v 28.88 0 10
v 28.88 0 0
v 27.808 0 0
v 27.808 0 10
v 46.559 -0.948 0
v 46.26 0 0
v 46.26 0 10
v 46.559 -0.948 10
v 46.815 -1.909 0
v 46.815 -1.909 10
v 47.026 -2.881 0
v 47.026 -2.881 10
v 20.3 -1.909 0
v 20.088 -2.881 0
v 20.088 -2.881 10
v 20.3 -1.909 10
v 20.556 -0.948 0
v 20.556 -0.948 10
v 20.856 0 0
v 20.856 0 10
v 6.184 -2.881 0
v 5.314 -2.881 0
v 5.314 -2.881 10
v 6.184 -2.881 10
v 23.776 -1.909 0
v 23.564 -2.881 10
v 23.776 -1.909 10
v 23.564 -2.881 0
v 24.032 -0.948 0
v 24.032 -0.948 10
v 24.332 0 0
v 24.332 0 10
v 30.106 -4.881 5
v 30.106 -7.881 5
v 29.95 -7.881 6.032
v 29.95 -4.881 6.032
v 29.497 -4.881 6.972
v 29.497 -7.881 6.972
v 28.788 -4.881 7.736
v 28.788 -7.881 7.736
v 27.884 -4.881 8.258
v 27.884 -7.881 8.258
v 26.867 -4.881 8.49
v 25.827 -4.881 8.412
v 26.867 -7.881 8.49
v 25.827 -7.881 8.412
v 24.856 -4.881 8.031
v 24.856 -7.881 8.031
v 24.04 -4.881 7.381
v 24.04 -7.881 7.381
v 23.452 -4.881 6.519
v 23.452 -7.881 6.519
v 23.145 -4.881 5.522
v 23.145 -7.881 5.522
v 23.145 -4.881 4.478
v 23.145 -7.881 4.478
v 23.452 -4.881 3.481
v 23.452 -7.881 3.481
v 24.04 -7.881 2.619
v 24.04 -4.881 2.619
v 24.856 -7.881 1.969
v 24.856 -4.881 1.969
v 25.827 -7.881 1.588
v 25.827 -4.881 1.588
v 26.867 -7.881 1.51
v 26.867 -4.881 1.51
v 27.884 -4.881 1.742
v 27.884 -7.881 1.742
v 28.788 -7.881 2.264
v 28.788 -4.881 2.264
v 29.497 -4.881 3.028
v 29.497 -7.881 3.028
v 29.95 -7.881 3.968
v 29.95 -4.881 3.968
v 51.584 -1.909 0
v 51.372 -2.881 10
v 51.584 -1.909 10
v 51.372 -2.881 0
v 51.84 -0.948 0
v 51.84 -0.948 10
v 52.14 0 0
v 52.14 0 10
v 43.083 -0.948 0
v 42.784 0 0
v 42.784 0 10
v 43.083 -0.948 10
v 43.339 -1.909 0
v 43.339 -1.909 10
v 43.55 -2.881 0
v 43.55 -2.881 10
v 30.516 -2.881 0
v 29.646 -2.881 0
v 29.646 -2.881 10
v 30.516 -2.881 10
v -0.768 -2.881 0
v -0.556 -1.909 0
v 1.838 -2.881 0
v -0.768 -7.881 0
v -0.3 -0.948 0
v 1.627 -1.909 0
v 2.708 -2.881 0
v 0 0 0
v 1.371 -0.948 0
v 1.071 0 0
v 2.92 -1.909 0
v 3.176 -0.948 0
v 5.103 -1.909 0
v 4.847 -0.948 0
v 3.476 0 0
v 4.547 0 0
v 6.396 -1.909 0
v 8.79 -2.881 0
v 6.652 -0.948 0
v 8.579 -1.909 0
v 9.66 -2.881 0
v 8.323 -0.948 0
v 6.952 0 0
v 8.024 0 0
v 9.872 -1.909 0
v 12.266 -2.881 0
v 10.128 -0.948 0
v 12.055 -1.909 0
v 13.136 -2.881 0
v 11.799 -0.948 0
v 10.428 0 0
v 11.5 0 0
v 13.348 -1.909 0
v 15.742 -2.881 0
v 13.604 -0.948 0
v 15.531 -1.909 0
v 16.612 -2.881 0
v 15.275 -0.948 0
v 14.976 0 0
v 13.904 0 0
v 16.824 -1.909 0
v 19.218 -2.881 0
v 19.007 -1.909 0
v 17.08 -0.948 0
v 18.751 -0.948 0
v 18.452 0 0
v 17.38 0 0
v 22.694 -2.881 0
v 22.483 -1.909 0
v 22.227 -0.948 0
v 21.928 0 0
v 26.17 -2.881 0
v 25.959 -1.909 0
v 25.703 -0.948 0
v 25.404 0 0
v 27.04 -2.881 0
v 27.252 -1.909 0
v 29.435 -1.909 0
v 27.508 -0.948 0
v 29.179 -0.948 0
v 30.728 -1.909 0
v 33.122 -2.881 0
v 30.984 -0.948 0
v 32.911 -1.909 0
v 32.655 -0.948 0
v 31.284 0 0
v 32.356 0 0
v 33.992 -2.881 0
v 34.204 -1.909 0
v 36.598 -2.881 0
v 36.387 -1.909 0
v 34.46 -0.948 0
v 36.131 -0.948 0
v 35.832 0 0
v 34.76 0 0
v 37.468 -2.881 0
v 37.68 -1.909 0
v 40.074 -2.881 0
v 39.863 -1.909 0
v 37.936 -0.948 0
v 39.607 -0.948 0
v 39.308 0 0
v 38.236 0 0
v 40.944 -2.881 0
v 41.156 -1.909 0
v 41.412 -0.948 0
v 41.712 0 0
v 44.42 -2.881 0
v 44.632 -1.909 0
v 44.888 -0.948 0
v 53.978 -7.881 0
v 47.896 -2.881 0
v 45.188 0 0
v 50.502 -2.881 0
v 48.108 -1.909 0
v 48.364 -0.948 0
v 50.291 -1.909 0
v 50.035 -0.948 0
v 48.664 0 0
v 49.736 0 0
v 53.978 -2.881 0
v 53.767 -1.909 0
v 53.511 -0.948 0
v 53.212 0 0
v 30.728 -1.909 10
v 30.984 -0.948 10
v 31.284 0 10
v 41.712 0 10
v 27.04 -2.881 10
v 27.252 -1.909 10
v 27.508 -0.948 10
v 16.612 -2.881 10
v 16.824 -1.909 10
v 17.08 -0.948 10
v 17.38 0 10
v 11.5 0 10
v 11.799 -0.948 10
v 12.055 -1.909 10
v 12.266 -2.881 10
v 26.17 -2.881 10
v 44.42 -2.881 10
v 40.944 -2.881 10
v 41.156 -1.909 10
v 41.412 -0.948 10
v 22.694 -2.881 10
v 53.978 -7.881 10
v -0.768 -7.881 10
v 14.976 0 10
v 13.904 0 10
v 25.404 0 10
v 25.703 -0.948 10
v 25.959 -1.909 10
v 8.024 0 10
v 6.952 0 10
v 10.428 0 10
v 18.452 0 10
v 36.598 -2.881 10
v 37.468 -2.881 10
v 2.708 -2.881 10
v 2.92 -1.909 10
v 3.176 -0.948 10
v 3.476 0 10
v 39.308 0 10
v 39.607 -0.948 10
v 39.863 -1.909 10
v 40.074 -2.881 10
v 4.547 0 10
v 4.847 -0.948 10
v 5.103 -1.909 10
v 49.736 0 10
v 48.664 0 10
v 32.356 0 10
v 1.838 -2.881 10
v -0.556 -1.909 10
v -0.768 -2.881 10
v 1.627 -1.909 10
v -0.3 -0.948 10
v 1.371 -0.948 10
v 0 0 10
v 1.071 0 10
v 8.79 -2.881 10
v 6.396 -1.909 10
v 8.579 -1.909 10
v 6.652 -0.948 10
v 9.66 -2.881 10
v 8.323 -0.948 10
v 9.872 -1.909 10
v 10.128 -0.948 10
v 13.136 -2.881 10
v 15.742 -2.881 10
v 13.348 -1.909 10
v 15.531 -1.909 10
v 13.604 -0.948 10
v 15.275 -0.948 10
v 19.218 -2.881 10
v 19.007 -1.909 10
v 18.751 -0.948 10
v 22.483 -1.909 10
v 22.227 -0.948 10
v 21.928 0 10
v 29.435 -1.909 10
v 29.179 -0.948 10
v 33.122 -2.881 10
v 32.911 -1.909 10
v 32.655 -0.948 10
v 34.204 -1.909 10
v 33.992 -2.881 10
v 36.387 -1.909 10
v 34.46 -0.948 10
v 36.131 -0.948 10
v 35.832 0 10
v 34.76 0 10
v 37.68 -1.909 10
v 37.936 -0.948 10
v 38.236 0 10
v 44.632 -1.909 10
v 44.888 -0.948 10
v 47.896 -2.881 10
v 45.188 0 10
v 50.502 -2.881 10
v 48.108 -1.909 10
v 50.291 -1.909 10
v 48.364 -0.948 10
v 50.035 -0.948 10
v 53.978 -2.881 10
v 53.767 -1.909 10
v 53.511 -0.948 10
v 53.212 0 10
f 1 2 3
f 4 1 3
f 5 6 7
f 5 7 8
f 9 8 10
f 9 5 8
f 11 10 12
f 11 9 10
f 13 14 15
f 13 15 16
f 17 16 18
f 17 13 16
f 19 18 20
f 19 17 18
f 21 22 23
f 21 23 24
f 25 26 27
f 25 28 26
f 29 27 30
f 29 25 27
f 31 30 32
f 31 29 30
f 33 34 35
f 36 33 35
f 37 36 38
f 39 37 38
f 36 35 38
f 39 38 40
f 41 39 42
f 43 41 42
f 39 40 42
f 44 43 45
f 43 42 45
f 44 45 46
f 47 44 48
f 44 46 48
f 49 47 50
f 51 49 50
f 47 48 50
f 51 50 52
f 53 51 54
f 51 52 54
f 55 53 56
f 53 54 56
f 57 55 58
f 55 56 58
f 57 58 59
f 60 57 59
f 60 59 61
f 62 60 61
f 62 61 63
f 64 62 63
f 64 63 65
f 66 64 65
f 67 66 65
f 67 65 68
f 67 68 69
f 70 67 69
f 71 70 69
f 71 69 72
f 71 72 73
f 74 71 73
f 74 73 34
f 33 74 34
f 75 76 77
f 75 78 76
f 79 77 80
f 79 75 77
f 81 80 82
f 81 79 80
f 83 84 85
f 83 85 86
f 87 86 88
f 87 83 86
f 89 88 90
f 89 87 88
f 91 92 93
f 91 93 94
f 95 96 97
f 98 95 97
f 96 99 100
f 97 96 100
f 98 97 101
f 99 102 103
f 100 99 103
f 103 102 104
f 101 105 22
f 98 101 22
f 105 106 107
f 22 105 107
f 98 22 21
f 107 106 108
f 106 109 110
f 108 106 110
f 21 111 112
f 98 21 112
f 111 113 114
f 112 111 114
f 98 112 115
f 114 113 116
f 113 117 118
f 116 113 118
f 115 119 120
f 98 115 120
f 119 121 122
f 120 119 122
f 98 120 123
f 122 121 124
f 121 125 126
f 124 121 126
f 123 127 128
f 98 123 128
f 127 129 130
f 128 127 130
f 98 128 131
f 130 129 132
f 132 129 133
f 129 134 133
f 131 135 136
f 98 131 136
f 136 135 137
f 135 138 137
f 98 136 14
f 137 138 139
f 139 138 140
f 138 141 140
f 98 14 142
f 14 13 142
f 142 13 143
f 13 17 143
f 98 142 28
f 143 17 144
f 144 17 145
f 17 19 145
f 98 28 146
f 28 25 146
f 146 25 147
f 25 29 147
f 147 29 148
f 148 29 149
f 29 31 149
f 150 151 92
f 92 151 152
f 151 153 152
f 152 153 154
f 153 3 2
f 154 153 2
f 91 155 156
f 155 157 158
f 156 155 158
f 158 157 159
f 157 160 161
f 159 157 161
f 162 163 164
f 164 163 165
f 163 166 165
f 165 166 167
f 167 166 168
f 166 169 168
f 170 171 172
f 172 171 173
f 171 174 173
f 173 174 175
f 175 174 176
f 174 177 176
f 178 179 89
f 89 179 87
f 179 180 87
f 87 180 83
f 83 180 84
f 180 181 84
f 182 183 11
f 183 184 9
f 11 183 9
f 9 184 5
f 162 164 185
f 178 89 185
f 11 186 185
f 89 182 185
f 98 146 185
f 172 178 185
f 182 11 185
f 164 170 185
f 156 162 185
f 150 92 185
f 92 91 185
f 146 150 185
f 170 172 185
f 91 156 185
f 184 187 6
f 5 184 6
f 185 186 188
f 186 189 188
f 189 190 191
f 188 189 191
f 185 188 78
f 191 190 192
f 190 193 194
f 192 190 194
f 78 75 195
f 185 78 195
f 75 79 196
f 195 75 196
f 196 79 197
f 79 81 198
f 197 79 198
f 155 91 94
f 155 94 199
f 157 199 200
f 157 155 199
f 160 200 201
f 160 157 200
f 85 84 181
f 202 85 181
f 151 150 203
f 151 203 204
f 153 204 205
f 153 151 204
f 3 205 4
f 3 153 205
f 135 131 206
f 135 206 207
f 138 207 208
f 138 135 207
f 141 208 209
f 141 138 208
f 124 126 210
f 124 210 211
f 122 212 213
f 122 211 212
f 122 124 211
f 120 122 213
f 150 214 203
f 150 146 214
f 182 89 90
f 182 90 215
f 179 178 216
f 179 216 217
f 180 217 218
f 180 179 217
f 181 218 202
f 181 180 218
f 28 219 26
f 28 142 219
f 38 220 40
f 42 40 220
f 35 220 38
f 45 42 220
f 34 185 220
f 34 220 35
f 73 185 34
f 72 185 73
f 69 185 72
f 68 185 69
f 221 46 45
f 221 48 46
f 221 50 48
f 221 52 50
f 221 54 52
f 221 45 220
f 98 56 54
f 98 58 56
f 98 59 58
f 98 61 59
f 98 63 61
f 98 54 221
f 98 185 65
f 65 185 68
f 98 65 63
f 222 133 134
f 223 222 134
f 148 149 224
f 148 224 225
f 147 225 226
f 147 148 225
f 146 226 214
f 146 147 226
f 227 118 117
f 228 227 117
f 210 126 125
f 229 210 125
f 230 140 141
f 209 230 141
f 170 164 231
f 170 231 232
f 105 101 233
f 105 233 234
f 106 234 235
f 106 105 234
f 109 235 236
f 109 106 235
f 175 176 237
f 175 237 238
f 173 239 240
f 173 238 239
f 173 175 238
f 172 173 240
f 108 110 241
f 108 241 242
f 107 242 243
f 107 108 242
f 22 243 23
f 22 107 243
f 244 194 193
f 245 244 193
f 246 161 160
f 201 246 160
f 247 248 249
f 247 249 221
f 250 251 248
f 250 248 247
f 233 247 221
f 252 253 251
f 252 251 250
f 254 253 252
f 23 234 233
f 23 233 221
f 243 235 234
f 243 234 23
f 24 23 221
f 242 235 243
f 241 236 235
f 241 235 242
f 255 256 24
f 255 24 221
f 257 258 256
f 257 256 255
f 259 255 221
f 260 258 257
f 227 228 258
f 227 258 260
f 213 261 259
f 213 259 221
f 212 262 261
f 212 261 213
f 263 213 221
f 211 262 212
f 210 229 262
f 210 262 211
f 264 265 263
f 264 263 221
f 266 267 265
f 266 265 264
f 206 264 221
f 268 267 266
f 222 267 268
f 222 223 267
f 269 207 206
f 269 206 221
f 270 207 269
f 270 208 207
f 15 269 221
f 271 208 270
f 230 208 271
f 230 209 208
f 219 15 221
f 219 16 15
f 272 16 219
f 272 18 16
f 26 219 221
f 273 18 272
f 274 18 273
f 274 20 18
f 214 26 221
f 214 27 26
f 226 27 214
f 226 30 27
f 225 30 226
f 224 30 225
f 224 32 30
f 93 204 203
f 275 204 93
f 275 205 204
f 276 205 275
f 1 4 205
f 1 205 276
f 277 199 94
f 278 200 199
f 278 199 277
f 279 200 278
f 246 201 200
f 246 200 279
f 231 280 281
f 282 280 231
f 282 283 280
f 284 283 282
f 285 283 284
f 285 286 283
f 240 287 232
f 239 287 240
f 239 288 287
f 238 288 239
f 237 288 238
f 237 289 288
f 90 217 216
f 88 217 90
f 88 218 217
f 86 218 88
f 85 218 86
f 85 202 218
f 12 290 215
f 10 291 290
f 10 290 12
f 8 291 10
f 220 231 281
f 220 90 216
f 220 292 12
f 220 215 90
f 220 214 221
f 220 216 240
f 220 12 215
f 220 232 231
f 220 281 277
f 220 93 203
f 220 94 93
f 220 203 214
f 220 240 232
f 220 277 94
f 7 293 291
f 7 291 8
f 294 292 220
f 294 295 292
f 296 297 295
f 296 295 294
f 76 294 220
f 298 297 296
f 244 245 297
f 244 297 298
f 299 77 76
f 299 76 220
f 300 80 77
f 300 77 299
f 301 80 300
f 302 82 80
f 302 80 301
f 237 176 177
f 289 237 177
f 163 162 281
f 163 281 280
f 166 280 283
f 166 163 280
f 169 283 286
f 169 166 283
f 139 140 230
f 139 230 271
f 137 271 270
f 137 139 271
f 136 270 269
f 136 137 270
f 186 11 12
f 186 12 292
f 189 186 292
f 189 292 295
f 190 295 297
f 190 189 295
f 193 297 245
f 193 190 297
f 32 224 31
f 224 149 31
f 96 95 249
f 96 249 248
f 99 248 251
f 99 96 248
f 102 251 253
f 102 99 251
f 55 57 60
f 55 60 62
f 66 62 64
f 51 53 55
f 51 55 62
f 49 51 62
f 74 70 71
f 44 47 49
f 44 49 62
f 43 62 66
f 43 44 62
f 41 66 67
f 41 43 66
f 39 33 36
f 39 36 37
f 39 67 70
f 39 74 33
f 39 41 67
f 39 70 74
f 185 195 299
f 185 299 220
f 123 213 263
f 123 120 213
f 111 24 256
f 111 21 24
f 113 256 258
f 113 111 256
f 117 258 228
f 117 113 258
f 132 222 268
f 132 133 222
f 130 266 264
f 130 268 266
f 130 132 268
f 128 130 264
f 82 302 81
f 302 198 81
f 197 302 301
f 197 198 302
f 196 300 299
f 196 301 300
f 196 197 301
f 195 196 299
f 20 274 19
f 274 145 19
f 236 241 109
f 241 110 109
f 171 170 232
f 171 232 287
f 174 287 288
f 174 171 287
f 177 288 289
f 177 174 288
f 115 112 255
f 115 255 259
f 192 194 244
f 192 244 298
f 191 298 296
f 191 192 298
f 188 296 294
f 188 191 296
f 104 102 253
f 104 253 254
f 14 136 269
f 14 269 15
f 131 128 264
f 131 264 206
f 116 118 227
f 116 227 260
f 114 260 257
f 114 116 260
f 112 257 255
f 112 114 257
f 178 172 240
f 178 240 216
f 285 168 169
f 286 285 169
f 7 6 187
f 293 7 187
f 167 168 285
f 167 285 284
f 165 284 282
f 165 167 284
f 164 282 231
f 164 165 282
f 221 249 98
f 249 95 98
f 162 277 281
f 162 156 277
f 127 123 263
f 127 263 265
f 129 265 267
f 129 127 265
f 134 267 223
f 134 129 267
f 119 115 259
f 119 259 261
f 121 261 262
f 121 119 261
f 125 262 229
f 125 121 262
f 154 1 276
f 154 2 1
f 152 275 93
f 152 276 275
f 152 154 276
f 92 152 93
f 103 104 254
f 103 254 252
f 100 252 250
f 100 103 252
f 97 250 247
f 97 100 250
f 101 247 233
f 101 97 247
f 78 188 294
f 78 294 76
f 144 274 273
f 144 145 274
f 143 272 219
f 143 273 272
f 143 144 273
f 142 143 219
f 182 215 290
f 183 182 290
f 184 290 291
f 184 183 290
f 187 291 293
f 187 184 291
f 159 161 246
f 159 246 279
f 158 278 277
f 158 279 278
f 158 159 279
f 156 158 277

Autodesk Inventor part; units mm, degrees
ref_plane "YZ Plane" through (0, 0, 0) normal (1, 0, 0) x (0, 1, 0)
ref_plane "XZ Plane" through (0, 0, 0) normal (0, 1, 0) x (-1, 0, 0)
ref_plane "XY Plane" through (0, 0, 0) normal (0, 0, 1) x (1, 0, 0)
sketch "Sketch1" plane through (0, 0, 0) normal (0, 0, 1) x (1, 0, 0)
  line L0 (0, 0) -> (1.071, 0)
  line L1 (0.5355, 0) -> (0.5355, -2.881)
  line L2 (0.5355, -2.881) -> (1.8385, -2.881)
  line L3 (1.8385, -2.881) -> (0.5355, -2.881)
  line L4 (0.5355, -2.881) -> (-0.7675, -2.881)
  arc A0 (0, 0) -> (-0.7675, -2.881) centre (20.5625, -7.0206) ccw
  arc A1 (1.8385, -2.881) -> (1.071, 0) centre (-19.4915, -7.0206) ccw
  line L5 (1.8385, -2.881) -> (2.7085, -2.881)
  line L6 (2.7085, -2.881) -> (5.3145, -2.881)
  line L7 (4.0115, -2.881) -> (4.0115, 0)
  line L8 (4.0115, 0) -> (3.476, 0)
  line L9 (4.0115, 0) -> (4.547, 0)
  arc A2 (3.476, 0) -> (2.7085, -2.881) centre (24.0385, -7.0206) ccw
  arc A3 (5.3145, -2.881) -> (4.547, 0) centre (-16.0155, -7.0206) ccw
  line L10 (5.3145, -2.881) -> (6.1845, -2.881)
  line L11 (6.1845, -2.881) -> (8.7905, -2.881)
  line L12 (7.4875, -2.881) -> (7.4875, 0)
  line L13 (7.4875, 0) -> (6.9515, 0)
  line L14 (7.4875, 0) -> (8.0235, 0)
  arc A4 (6.9515, 0) -> (6.1845, -2.881) centre (27.5152, -7.0172) ccw
  arc A5 (8.7905, -2.881) -> (8.0235, 0) centre (-12.5402, -7.0172) ccw
  line L15 (8.7905, -2.881) -> (9.6605, -2.881)
  line L16 (9.6605, -2.881) -> (12.2665, -2.881)
  line L17 (10.9635, -2.881) -> (10.9635, 0)
  line L18 (10.9635, 0) -> (10.4275, 0)
  line L19 (10.9635, 0) -> (11.4995, 0)
  arc A6 (10.4275, 0) -> (9.6605, -2.881) centre (30.9912, -7.0172) ccw
  arc A7 (12.2665, -2.881) -> (11.4995, 0) centre (-9.0642, -7.0172) ccw
  line L20 (-0.7675, -2.881) -> (-0.7675, -7.881)
  line L21 (12.2665, -2.881) -> (13.1365, -2.881)
  line L22 (13.1365, -2.881) -> (15.7425, -2.881)
  line L23 (14.4395, -2.881) -> (14.4395, 0)
  line L24 (14.4395, 0) -> (13.9035, 0)
  line L25 (14.4395, 0) -> (14.9755, 0)
  arc A8 (13.9035, 0) -> (13.1365, -2.881) centre (34.4672, -7.0172) ccw
  arc A9 (15.7425, -2.881) -> (14.9755, 0) centre (-5.5882, -7.0172) ccw
  line L26 (15.7425, -2.881) -> (16.6125, -2.881)
  line L27 (16.6125, -2.881) -> (19.2185, -2.881)
  line L28 (17.9155, -2.881) -> (17.9155, 0)
  line L29 (17.9155, 0) -> (17.3795, 0)
  line L30 (17.9155, 0) -> (18.4515, 0)
  arc A10 (17.3795, 0) -> (16.6125, -2.881) centre (37.9432, -7.0172) ccw
  arc A11 (19.2185, -2.881) -> (18.4515, 0) centre (-2.1122, -7.0172) ccw
  line L31 (19.2185, -2.881) -> (20.0885, -2.881)
  line L32 (20.0885, -2.881) -> (22.6945, -2.881)
  line L33 (21.3915, -2.881) -> (21.3915, 0)
  line L34 (21.3915, 0) -> (20.8555, 0)
  line L35 (21.3915, 0) -> (21.9275, 0)
  arc A12 (20.8555, 0) -> (20.0885, -2.881) centre (41.4192, -7.0172) ccw
  arc A13 (22.6945, -2.881) -> (21.9275, 0) centre (1.3638, -7.0172) ccw
  line L36 (22.6945, -2.881) -> (23.5645, -2.881)
  line L37 (23.5645, -2.881) -> (26.1705, -2.881)
  line L38 (24.8675, -2.881) -> (24.8675, 0)
  line L39 (24.8675, 0) -> (24.3315, 0)
  line L40 (24.8675, 0) -> (25.4035, 0)
  arc A14 (24.3315, 0) -> (23.5645, -2.881) centre (44.8952, -7.0172) ccw
  arc A15 (26.1705, -2.881) -> (25.4035, 0) centre (4.8398, -7.0172) ccw
  line L41 (26.1705, -2.881) -> (27.0405, -2.881)
  line L42 (27.0405, -2.881) -> (29.6465, -2.881)
  line L43 (29.6465, -2.881) -> (30.5165, -2.881)
  line L44 (30.5165, -2.881) -> (33.1225, -2.881)
  line L45 (33.1225, -2.881) -> (33.9925, -2.881)
  line L46 (33.9925, -2.881) -> (36.5985, -2.881)
  line L47 (36.5985, -2.881) -> (37.4685, -2.881)
  line L48 (37.4685, -2.881) -> (40.0745, -2.881)
  line L49 (40.0745, -2.881) -> (40.9445, -2.881)
  line L50 (40.9445, -2.881) -> (43.5505, -2.881)
  line L51 (43.5505, -2.881) -> (44.4205, -2.881)
  line L52 (44.4205, -2.881) -> (47.0265, -2.881)
  line L53 (47.0265, -2.881) -> (47.8965, -2.881)
  line L54 (47.8965, -2.881) -> (50.5025, -2.881)
  line L55 (50.5025, -2.881) -> (51.3725, -2.881)
  line L56 (51.3725, -2.881) -> (53.9785, -2.881)
  line L57 (53.9785, -2.881) -> (53.9785, -7.881)
  line L58 (53.9785, -7.881) -> (-0.7675, -7.881)
  line L59 (28.3435, -2.881) -> (28.3435, 0)
  line L60 (31.8195, -2.881) -> (31.8195, 0)
  line L61 (31.8195, 0) -> (31.2835, 0)
  line L62 (35.2955, -2.881) -> (35.2955, 0)
  line L63 (35.2955, 0) -> (34.7595, 0)
  line L64 (38.7715, -2.881) -> (38.7715, 0)
  line L65 (38.7715, 0) -> (38.2355, 0)
  line L66 (42.2475, -2.881) -> (42.2475, 0)
  line L67 (42.2475, 0) -> (41.7115, 0)
  line L68 (45.7235, -2.881) -> (45.7235, 0)
  line L69 (45.7235, 0) -> (45.1875, 0)
  line L70 (49.1995, -2.881) -> (49.1995, 0)
  line L71 (49.1995, 0) -> (48.6635, 0)
  line L72 (52.6755, -2.881) -> (52.6755, 0)
  line L73 (52.6755, 0) -> (52.1395, 0)
  line L74 (52.6755, 0) -> (53.2115, 0)
  line L75 (49.1995, 0) -> (49.7355, 0)
  line L76 (45.7235, 0) -> (46.2595, 0)
  line L77 (42.2475, 0) -> (42.7835, 0)
  line L78 (38.7715, 0) -> (39.3075, 0)
  line L79 (35.2955, 0) -> (35.8315, 0)
  line L80 (31.8195, 0) -> (32.3555, 0)
  line L81 (28.3435, 0) -> (28.8795, 0)
  line L82 (28.3435, 0) -> (27.8075, 0)
  arc A16 (27.8075, 0) -> (27.0405, -2.881) centre (48.3712, -7.0172) ccw
  arc A17 (29.6465, -2.881) -> (28.8795, 0) centre (8.3158, -7.0172) ccw
  arc A18 (31.2835, 0) -> (30.5165, -2.881) centre (51.8472, -7.0172) ccw
  arc A19 (33.1225, -2.881) -> (32.3555, 0) centre (11.7918, -7.0172) ccw
  arc A20 (34.7595, 0) -> (33.9925, -2.881) centre (55.3232, -7.0172) ccw
  arc A21 (36.5985, -2.881) -> (35.8315, 0) centre (15.2678, -7.0172) ccw
  arc A22 (38.2355, 0) -> (37.4685, -2.881) centre (58.7992, -7.0172) ccw
  arc A23 (40.0745, -2.881) -> (39.3075, 0) centre (18.7438, -7.0172) ccw
  arc A24 (41.7115, 0) -> (40.9445, -2.881) centre (62.2752, -7.0172) ccw
  arc A25 (43.5505, -2.881) -> (42.7835, 0) centre (22.2198, -7.0172) ccw
  arc A26 (45.1875, 0) -> (44.4205, -2.881) centre (65.7512, -7.0172) ccw
  arc A27 (47.0265, -2.881) -> (46.2595, 0) centre (25.6958, -7.0172) ccw
  arc A28 (48.6635, 0) -> (47.8965, -2.881) centre (69.2272, -7.0172) ccw
  arc A29 (50.5025, -2.881) -> (49.7355, 0) centre (29.1718, -7.0172) ccw
  arc A30 (52.1395, 0) -> (51.3725, -2.881) centre (72.7032, -7.0172) ccw
  arc A31 (53.9785, -2.881) -> (53.2115, 0) centre (32.6478, -7.0172) ccw
  dimension "d0" = 1.071
  dimension "d1" = 2.881
  dimension "d3" = 1.303
  dimension "d4" = 1.303
  dimension "d5" = 21.728
  dimension "d6" = 21.728
  dimension "d7" = 0.87
  dimension "d8" = 2.606
  dimension "d9" = 0.5355
  dimension "d10" = 0.5355
  dimension "d11" = 21.728
  dimension "d12" = 21.728
  dimension "d13" = 0.87
  dimension "d14" = 2.606
  dimension "d15" = 0.536
  dimension "d16" = 0.536
  dimension "d17" = 21.728
  dimension "d18" = 21.728
  dimension "d19" = 0.87
  dimension "d20" = 2.606
  dimension "d21" = 0.536
  dimension "d22" = 0.536
  dimension "d23" = 21.728
  dimension "d24" = 21.728
  dimension "d25" = 5
  dimension "d27" = 0.87
  dimension "d28" = 2.606
  dimension "d29" = 0.536
  dimension "d30" = 0.536
  dimension "d31" = 21.728
  dimension "d32" = 21.728
  dimension "d33" = 0.87
  dimension "d34" = 2.606
  dimension "d35" = 0.536
  dimension "d36" = 0.536
  dimension "d37" = 21.728
  dimension "d38" = 21.728
  dimension "d39" = 0.87
  dimension "d40" = 2.606
  dimension "d41" = 0.536
  dimension "d42" = 0.536
  dimension "d43" = 21.728
  dimension "d44" = 21.728
  dimension "d45" = 0.87
  dimension "d46" = 2.606
  dimension "d47" = 0.536
  dimension "d48" = 0.536
  dimension "d49" = 21.728
  dimension "d50" = 21.728
  dimension "d51" = 0.87
  dimension "d52" = 2.606
  dimension "d53" = 0.87
  dimension "d54" = 2.606
  dimension "d55" = 0.87
  dimension "d56" = 2.606
  dimension "d57" = 0.87
  dimension "d58" = 2.606
  dimension "d59" = 0.87
  dimension "d60" = 2.606
  dimension "d61" = 0.87
  dimension "d62" = 2.606
  dimension "d63" = 0.87
  dimension "d64" = 2.606
  dimension "d65" = 0.87
extrude "Extrusion1" add sketch "Sketch1" along normal blind 10
sketch "Sketch3" plane through (-0.7675, -7.881, 0) normal (0, -1, 0) x (1, 0, 0)
  circle A0 centre (27.373, 5) radius 3.5
  line L0 (54.746, 0) -> (54.746, 10) projected
  line L1 (0, 0) -> (54.746, 0) projected
  point P0 (0.7675, 0)
  dimension "d104" = 7
  dimension "d105" = 27.373
  dimension "d106" = 5
extrude "Extrusion3" cut sketch "Sketch3" against normal blind 3
properties part number "1p10 DP3 gear attachment"
